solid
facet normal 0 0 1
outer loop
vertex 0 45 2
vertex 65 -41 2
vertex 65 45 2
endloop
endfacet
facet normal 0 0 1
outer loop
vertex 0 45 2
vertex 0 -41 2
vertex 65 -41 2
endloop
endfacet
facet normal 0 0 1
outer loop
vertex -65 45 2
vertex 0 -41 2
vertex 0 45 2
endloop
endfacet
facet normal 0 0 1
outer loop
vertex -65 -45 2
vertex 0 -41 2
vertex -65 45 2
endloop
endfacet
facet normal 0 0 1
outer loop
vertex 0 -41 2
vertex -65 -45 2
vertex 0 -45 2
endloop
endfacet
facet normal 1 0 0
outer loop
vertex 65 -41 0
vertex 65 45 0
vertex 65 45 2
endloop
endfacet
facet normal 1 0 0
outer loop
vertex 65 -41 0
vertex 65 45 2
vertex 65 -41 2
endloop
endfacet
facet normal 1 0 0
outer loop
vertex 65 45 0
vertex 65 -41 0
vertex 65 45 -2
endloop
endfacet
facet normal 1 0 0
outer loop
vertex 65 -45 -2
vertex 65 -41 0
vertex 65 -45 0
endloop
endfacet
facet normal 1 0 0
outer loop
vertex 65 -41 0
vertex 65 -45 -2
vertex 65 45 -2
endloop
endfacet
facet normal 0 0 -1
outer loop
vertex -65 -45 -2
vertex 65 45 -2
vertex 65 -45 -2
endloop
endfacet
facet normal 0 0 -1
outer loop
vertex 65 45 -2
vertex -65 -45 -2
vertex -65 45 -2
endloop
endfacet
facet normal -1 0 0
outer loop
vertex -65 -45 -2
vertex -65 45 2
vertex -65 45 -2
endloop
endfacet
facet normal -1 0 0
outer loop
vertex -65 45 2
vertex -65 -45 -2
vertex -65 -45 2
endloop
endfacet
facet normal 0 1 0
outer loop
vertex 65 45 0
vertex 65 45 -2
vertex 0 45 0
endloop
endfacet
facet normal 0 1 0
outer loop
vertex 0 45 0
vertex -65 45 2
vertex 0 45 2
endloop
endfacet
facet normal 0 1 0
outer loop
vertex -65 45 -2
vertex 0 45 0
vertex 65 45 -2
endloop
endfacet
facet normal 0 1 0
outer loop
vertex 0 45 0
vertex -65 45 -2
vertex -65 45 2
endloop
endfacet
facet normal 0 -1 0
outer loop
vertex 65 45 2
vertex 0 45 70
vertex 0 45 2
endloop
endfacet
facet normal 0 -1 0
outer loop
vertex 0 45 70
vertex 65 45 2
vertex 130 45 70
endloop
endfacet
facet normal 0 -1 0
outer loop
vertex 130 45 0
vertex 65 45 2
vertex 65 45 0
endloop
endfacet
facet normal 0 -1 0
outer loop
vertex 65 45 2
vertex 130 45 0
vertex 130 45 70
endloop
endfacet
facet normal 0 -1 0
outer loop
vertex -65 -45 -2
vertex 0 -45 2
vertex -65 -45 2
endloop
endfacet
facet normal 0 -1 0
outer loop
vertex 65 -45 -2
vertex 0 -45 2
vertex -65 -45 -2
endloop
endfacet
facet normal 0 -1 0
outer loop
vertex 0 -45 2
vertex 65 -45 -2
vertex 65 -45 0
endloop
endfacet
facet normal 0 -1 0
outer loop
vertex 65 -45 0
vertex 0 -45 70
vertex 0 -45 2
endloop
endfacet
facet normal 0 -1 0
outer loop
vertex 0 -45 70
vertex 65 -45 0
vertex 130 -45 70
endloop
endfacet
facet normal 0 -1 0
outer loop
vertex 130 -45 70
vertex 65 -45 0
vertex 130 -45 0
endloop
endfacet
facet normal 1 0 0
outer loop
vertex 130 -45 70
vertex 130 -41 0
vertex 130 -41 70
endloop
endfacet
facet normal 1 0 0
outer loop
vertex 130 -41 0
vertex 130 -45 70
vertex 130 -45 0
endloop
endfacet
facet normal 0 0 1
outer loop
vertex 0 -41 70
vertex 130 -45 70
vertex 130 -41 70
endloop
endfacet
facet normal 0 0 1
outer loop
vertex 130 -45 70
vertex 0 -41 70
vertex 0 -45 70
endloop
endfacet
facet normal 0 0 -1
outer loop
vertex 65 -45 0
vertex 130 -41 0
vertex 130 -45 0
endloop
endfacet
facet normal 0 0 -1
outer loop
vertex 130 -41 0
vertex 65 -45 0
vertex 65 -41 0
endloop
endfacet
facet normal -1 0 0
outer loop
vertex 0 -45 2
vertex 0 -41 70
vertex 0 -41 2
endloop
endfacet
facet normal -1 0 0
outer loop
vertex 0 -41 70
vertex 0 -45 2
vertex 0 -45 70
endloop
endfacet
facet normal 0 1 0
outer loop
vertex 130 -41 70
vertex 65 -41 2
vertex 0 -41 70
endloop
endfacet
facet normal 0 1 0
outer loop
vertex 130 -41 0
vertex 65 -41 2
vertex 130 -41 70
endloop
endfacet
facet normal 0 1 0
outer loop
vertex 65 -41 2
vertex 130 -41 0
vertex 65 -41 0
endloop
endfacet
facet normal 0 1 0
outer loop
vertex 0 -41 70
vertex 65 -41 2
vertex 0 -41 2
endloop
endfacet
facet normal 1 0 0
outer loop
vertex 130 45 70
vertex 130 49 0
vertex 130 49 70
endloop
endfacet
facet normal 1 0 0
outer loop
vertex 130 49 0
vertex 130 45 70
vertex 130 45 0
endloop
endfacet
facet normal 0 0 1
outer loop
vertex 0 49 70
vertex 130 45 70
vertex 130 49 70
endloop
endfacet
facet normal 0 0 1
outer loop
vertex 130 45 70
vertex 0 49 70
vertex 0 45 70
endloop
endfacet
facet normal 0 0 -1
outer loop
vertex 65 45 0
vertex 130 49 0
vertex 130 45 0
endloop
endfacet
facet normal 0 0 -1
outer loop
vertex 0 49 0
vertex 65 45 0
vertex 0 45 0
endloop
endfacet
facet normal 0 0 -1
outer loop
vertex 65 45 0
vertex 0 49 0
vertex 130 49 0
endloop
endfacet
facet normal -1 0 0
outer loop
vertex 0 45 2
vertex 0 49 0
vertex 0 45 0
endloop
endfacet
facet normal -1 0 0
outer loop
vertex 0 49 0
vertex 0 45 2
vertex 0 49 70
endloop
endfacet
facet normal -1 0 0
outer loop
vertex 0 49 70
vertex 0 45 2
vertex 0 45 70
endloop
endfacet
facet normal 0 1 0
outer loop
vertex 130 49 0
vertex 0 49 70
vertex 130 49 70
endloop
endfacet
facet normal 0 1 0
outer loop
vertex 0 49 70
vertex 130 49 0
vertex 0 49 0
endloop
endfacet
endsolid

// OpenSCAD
// Dimensions for the Falcon tube rack
$fn = 64; // Ensure smooth curves

// Plate dimensions
plate_length_X = 130;   // mm
plate_width_Y = 90;     // mm
plate_thickness_Z = 4;   // mm

// Hole dimensions
hole_diameter = 30.5;     // mm
hole_spacing_X = 40; // mm between centres (along X)
hole_spacing_Y = 40;   // mm between centres (along Y)

// Wall dimensions
wall_length_X = plate_length_X;   // 130 mm
wall_thickness_Y = 4;             // mm (along Y)
wall_height_Z = 70;             // mm (up from plate)

// Calculate hole positions: 2 rows (Y), 3 columns (X), centred on plate
// Centre of plate: (plate_length_X/2, plate_width_Y/2)
// First hole at (plate_length_X/2 - hole_spacing_X, plate_width_Y/2 - hole_spacing_Y/2)
// But we'll use for loops to place them

// Start with the base plate
module base_plate() {
    translate([0, 0, 0])
    cube([plate_length_X, plate_width_Y, plate_thickness_Z], center = true);
}

// Create the six through-holes
module holes() {
    for (i = [0:2]) {
        for (j = [0:1]) {
            // Calculate X and Y positions: 3 columns (i=0,1,2), 2 rows (j=0,1)
            // Centre of hole grid: X = plate_length_X / 2, Y = plate_width_Y / 2
            // First hole at X = plate_length_X/2 - hole_spacing_X, Y = plate_width_Y/2 - hole_spacing_Y/2
            // Then step by hole_spacing_X in X, hole_spacing_Y in Y
            x_pos = plate_length_X / 2 - hole_spacing_X + i * hole_spacing_X;
            y_pos = plate_width_Y / 2 - hole_spacing_Y/2 + j * hole_spacing_Y;

            // Cut hole through the plate: extend slightly beyond to ensure clean cut
            translate([x_pos, y_pos, -0.1])
            cylinder(h = plate_thickness_Z + 0.2, d = hole_diameter, center = true);
        }
    }
}

// Create the two walls along the long edges (along X)
// Wall 1: at Y = -plate_width_Y/2 (bottom edge)
// Wall 2: at Y = +plate_width_Y/2 (top edge)
module walls() {
    // Wall 1: at bottom edge (Y = -plate_width_Y/2)
    translate([0, -plate_width_Y/2, 0])
    cube([wall_length_X, wall_thickness_Y, wall_height_Z], center = false);

    // Wall 2: at top edge (Y = +plate_width_Y/2)
    translate([0, +plate_width_Y/2, 0])
    cube([wall_length_X, wall_thickness_Y, wall_height_Z], center = false);
}

// Assemble the rack: base plate + holes + walls
difference() {
    base_plate();
    holes();
}

// Add walls on top of the plate (they are solid and separate from the plate)
// Use union to attach walls to the plate
union() {
    base_plate();
    walls();
}
